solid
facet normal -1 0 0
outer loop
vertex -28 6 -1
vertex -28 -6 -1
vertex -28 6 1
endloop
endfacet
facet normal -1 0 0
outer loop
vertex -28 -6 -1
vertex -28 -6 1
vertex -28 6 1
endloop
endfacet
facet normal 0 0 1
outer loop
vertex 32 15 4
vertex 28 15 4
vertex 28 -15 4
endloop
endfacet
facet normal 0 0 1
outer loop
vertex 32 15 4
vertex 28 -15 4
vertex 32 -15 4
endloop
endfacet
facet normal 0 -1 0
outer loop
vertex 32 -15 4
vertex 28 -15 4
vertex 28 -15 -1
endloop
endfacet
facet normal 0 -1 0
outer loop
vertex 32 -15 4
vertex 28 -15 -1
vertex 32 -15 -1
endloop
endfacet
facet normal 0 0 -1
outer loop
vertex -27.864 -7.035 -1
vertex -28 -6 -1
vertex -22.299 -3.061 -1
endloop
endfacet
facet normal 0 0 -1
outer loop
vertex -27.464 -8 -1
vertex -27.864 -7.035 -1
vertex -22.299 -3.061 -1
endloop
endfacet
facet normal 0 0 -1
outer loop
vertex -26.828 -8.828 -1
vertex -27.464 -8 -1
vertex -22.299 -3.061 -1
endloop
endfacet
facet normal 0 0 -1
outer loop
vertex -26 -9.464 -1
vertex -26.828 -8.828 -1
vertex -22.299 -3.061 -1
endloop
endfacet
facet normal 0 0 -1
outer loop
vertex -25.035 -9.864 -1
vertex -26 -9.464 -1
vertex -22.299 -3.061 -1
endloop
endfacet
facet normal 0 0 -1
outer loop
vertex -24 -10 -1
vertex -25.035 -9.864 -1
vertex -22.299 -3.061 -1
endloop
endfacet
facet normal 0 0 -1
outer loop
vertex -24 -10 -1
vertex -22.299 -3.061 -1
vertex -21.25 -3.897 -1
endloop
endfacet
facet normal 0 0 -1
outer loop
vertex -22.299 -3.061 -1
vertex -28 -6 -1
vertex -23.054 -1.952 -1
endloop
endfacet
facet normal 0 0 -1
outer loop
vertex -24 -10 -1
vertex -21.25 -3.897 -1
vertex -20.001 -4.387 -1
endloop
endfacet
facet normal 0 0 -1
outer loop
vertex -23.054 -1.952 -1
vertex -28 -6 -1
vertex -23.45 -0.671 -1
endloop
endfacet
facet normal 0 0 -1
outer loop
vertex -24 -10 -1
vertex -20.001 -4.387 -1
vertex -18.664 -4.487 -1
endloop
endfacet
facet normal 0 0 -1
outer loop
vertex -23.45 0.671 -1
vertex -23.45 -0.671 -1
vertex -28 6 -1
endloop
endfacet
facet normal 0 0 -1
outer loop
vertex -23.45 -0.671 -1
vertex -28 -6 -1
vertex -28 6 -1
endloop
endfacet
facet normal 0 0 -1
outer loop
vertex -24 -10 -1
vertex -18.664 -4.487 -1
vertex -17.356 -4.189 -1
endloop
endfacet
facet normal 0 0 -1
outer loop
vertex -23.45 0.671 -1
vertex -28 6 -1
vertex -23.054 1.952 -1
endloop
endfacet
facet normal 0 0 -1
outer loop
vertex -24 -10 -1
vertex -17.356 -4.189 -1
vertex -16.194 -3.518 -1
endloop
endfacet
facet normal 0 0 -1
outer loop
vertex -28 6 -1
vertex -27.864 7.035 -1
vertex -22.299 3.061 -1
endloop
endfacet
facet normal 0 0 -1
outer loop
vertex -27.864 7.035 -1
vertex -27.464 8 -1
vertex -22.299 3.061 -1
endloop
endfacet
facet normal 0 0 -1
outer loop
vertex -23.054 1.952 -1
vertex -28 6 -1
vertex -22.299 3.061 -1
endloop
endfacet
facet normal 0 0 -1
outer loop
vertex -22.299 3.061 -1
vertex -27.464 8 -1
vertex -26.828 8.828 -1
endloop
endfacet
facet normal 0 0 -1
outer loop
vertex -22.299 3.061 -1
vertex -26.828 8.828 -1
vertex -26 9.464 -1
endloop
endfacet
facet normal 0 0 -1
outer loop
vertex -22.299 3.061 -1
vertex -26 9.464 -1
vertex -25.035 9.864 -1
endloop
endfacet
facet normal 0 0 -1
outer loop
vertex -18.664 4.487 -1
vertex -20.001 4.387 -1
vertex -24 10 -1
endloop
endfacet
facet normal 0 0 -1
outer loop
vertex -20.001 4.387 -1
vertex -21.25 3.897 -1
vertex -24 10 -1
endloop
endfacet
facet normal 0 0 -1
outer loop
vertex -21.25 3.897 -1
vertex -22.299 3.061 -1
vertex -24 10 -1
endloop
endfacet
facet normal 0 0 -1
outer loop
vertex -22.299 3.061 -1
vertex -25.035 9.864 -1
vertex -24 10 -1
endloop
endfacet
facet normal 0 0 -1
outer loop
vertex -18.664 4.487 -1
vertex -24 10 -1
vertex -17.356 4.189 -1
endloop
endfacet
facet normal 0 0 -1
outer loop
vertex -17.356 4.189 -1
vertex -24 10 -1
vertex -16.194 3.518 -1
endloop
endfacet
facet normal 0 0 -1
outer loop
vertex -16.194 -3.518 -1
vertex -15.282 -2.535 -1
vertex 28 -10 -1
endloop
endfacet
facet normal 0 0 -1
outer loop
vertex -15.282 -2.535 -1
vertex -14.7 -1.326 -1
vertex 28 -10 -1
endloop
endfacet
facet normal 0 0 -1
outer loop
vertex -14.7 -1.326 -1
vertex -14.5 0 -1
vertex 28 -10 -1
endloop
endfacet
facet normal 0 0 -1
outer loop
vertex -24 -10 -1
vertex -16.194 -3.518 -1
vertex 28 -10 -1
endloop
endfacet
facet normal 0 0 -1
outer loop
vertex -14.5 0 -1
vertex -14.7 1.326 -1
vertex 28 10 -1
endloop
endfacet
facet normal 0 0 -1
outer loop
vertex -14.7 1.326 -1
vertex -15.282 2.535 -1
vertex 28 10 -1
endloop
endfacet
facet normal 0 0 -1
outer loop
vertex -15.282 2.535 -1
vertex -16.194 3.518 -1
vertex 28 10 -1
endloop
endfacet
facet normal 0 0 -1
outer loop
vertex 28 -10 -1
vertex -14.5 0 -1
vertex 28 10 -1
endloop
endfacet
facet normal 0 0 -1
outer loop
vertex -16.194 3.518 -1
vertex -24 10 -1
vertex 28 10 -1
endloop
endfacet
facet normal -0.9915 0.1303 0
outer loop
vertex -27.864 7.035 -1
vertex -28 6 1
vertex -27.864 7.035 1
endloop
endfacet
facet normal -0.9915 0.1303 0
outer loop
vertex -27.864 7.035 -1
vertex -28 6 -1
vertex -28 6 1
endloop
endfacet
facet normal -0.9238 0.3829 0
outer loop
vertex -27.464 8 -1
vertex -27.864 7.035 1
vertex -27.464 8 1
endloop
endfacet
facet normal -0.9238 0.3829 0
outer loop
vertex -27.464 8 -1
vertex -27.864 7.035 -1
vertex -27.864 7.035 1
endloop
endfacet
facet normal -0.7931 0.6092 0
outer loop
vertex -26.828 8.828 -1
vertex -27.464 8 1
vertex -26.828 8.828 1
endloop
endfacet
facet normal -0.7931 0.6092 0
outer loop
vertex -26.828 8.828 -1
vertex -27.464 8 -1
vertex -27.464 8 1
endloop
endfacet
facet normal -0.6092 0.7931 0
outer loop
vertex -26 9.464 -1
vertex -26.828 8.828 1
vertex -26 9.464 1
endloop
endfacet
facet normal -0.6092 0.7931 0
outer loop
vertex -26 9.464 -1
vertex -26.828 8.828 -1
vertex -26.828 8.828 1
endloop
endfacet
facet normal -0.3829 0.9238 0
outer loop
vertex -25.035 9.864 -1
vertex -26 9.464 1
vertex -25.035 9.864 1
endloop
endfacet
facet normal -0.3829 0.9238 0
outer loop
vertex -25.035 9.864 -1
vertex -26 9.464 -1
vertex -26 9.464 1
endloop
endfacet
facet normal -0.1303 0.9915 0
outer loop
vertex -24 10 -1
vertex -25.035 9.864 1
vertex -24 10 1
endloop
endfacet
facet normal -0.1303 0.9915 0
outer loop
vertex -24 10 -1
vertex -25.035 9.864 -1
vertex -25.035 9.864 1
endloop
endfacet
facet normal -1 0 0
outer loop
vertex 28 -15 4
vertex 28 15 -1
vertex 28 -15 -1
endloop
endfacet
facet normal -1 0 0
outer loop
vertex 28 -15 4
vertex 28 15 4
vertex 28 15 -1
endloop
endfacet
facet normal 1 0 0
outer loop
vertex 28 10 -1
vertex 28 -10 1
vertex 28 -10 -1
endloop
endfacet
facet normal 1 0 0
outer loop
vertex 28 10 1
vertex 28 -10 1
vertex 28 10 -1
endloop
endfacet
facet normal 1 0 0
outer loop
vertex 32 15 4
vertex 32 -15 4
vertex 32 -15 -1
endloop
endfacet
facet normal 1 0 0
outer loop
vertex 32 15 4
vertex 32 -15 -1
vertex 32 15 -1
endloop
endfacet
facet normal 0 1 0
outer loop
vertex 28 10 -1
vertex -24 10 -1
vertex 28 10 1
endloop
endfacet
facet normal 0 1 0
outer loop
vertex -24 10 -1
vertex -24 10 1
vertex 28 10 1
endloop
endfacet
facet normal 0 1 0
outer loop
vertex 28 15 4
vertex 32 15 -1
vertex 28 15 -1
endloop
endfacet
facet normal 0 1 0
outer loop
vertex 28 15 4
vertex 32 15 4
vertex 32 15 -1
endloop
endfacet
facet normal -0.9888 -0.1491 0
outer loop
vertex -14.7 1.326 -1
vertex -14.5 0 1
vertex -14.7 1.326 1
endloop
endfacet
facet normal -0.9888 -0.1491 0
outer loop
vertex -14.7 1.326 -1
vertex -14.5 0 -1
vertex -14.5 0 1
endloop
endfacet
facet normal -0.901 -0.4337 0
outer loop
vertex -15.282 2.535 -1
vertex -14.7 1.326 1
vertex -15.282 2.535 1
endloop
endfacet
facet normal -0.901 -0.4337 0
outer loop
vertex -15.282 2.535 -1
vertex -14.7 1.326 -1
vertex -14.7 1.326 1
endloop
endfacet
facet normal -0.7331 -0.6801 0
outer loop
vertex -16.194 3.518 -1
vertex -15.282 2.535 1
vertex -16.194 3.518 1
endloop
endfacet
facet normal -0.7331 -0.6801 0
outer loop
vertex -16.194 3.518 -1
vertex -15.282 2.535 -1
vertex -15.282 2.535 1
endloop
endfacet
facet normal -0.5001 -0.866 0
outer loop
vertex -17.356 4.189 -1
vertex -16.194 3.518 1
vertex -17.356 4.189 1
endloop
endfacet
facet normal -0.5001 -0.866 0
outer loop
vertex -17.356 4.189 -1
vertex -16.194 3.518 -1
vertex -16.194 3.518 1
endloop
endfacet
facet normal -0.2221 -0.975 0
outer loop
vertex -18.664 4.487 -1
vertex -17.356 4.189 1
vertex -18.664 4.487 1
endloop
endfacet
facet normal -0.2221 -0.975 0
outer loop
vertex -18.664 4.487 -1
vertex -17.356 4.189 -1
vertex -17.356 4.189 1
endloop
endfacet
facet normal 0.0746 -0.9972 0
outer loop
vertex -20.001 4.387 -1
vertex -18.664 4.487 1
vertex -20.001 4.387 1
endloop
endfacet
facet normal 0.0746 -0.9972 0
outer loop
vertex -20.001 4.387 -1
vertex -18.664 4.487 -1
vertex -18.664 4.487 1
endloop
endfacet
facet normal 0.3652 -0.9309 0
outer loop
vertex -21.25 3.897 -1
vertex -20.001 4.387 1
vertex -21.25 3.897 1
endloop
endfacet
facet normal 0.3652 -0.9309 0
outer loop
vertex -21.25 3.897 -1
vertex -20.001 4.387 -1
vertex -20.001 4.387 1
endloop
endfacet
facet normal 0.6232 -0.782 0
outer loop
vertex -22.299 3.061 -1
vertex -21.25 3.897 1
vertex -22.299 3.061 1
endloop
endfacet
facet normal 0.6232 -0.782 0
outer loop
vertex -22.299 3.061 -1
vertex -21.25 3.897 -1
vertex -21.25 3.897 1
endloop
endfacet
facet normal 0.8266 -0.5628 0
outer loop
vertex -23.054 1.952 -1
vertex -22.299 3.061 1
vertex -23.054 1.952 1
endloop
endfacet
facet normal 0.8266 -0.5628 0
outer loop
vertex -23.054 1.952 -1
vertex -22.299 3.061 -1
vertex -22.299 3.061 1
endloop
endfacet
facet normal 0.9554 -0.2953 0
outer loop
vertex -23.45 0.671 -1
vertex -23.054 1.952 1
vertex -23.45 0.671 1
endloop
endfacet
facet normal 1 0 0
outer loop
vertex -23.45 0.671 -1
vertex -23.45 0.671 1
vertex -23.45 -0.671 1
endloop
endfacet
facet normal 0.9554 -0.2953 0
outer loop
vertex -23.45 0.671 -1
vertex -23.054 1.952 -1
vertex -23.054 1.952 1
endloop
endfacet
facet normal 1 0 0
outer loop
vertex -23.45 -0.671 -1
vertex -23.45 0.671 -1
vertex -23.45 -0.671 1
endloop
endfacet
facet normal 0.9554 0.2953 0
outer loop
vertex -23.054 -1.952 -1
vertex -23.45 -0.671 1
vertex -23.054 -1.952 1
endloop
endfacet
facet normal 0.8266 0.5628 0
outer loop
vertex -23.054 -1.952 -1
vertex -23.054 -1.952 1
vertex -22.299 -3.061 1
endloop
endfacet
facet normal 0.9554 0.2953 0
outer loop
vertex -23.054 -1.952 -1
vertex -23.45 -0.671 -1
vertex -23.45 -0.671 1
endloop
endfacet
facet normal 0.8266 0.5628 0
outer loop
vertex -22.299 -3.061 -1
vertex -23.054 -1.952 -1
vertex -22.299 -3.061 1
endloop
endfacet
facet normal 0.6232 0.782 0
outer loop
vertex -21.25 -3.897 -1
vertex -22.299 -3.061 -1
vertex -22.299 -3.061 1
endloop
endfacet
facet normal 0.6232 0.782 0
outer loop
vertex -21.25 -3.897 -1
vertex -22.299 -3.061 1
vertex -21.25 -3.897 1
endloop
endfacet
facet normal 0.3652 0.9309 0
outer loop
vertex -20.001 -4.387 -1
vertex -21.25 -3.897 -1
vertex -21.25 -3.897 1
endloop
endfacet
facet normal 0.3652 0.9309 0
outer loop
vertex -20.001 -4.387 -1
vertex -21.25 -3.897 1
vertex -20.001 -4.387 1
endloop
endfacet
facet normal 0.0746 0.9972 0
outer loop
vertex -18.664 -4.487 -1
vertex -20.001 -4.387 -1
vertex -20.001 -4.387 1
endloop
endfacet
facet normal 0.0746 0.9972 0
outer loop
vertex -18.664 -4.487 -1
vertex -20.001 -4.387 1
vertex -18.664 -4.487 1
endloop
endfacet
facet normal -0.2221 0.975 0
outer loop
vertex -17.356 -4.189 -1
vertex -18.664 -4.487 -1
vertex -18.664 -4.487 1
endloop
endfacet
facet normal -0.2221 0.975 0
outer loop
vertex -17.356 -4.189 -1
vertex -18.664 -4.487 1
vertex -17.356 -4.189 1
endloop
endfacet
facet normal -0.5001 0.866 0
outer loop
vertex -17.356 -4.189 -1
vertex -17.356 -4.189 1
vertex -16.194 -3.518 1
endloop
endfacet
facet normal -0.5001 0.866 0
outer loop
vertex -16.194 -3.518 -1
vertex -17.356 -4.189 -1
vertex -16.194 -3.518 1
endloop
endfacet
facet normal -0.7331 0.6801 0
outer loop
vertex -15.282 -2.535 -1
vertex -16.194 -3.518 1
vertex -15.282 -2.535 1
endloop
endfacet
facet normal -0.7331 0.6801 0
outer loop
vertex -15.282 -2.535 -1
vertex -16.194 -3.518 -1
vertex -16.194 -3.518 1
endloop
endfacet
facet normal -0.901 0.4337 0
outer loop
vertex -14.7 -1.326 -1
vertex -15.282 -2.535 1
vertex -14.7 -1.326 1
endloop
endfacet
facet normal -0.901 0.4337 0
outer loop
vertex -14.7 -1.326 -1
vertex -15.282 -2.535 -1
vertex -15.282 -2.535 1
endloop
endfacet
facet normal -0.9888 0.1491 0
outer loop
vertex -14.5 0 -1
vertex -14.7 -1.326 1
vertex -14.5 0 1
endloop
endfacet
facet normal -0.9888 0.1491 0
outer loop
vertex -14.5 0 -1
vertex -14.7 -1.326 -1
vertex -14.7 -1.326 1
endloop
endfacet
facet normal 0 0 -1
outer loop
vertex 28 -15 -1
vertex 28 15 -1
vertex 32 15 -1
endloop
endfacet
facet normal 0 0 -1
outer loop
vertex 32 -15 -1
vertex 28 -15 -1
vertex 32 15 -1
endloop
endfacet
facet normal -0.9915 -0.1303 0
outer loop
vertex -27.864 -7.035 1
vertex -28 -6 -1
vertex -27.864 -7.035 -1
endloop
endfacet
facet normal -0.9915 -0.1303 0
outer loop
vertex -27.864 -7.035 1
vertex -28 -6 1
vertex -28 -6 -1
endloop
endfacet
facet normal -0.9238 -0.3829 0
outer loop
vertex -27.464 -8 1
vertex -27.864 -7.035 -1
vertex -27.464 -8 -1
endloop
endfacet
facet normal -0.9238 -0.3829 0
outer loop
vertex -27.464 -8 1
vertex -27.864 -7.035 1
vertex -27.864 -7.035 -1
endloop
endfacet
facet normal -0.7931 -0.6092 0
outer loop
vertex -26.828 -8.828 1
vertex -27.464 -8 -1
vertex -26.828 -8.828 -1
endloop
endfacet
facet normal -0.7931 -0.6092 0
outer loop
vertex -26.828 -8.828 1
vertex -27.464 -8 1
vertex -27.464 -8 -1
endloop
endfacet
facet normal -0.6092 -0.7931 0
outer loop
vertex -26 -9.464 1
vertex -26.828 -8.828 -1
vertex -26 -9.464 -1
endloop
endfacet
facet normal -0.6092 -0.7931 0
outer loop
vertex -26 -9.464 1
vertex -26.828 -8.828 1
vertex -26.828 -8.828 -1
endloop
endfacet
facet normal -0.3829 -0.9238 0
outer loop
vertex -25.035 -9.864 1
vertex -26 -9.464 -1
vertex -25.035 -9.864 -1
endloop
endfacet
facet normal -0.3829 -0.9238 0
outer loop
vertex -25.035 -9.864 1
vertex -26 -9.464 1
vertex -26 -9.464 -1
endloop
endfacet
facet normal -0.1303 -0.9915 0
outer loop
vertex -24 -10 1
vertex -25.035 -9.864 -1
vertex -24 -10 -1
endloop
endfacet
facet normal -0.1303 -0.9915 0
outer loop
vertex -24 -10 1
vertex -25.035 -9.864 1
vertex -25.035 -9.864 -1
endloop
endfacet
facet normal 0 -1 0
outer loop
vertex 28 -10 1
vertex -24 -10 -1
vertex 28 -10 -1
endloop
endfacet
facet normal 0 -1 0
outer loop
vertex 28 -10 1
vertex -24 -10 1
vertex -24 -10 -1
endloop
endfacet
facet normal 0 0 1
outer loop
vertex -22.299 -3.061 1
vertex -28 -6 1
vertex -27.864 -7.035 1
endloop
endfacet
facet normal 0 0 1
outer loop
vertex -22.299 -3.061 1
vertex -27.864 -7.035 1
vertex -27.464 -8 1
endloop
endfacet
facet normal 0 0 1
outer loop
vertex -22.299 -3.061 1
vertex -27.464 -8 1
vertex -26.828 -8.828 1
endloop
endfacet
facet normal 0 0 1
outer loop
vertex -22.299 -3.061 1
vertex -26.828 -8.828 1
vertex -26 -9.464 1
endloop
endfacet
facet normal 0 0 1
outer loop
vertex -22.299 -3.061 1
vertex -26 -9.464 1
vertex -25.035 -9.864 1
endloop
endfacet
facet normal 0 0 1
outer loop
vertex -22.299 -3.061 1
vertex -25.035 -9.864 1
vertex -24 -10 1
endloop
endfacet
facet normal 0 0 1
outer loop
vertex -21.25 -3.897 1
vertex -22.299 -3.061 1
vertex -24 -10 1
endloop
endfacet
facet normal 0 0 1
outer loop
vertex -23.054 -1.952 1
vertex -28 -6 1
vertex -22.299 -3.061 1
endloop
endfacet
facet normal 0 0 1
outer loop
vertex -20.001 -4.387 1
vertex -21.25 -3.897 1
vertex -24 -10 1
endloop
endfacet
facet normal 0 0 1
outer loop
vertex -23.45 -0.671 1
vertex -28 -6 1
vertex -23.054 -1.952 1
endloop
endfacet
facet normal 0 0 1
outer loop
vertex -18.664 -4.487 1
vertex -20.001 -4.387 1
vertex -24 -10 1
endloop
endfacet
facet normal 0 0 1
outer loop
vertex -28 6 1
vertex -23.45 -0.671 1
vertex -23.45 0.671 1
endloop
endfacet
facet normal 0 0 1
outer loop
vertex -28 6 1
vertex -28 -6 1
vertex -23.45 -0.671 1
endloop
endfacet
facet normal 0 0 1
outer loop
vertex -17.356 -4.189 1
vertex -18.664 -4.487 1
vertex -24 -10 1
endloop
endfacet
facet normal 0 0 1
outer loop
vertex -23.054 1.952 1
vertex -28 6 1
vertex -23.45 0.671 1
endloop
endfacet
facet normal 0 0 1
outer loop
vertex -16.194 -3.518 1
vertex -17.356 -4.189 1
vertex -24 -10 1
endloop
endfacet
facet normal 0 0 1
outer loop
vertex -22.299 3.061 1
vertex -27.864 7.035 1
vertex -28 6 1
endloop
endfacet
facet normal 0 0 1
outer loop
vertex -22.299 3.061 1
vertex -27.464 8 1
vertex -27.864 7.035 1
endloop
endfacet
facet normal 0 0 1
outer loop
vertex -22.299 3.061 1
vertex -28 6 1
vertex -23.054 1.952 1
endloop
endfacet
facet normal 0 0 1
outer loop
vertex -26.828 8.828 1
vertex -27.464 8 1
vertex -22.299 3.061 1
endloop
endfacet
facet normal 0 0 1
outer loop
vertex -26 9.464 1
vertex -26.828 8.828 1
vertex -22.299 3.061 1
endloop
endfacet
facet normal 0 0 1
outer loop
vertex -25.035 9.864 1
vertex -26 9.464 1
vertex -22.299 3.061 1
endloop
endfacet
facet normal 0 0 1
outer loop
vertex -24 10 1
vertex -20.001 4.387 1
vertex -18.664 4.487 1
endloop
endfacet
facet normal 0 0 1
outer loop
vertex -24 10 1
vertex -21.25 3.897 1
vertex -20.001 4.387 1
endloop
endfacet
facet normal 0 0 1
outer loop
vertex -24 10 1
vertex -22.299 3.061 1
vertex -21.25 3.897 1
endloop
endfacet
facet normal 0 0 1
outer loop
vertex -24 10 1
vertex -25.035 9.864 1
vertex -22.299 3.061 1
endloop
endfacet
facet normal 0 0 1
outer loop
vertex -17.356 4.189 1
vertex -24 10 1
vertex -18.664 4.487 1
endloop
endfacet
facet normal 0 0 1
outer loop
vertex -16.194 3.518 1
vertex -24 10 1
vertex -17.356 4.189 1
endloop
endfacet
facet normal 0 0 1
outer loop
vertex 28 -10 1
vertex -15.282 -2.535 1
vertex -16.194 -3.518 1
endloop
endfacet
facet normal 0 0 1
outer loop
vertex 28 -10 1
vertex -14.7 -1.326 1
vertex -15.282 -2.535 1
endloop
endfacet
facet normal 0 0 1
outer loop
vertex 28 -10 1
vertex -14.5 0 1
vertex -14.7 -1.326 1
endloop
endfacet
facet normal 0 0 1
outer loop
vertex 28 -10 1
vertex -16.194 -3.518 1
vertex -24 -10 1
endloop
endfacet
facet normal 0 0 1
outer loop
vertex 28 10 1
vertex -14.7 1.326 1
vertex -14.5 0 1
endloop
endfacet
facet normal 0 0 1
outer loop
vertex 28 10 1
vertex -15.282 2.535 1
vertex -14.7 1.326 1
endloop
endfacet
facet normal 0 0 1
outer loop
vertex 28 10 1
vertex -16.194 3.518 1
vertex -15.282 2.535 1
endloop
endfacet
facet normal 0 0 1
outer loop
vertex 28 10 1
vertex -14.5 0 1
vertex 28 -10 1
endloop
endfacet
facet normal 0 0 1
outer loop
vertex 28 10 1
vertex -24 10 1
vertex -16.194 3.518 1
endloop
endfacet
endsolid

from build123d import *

# Parameters (mm, degrees)
F1_DEPTH      = 4
F1_DEPTH_BACK = 1
F0_W          = 56
F0_H          = 20
F0_R          = 4.5
F2_DEPTH      = 1
F3_R          = 4
F4_R          = 4


with BuildPart() as f1:
    # F0 (on Top) → F1 (new body, two sides)
    with BuildSketch(Plane.XY) as f1_sk:
        Polygon((28, 15), (28, 10), (28, -10), (28, -15), (32, -15), (32, 15), align=None)
    extrude(amount=F1_DEPTH)
    extrude(f1_sk.sketch, amount=-F1_DEPTH_BACK)


with BuildPart() as f2:
    # F0 (on Top) → F2 (new body, symmetric)
    with BuildSketch(Plane.XY):
        Rectangle(F0_W, F0_H)
        with Locations((-19, 0)):
            Circle(F0_R, mode=Mode.SUBTRACT)
    extrude(amount=F2_DEPTH, both=True)

    # F3
    f3_edges = [f2.edges().sort_by_distance(p)[0] for p in [
        (-28, -10, 0),
    ]]
    fillet(f3_edges, radius=F3_R)

    # F4
    f4_edges = [f2.edges().sort_by_distance(p)[0] for p in [
        (-28, 10, 0),
    ]]
    fillet(f4_edges, radius=F4_R)


solid = Compound([f1.part, f2.part])
